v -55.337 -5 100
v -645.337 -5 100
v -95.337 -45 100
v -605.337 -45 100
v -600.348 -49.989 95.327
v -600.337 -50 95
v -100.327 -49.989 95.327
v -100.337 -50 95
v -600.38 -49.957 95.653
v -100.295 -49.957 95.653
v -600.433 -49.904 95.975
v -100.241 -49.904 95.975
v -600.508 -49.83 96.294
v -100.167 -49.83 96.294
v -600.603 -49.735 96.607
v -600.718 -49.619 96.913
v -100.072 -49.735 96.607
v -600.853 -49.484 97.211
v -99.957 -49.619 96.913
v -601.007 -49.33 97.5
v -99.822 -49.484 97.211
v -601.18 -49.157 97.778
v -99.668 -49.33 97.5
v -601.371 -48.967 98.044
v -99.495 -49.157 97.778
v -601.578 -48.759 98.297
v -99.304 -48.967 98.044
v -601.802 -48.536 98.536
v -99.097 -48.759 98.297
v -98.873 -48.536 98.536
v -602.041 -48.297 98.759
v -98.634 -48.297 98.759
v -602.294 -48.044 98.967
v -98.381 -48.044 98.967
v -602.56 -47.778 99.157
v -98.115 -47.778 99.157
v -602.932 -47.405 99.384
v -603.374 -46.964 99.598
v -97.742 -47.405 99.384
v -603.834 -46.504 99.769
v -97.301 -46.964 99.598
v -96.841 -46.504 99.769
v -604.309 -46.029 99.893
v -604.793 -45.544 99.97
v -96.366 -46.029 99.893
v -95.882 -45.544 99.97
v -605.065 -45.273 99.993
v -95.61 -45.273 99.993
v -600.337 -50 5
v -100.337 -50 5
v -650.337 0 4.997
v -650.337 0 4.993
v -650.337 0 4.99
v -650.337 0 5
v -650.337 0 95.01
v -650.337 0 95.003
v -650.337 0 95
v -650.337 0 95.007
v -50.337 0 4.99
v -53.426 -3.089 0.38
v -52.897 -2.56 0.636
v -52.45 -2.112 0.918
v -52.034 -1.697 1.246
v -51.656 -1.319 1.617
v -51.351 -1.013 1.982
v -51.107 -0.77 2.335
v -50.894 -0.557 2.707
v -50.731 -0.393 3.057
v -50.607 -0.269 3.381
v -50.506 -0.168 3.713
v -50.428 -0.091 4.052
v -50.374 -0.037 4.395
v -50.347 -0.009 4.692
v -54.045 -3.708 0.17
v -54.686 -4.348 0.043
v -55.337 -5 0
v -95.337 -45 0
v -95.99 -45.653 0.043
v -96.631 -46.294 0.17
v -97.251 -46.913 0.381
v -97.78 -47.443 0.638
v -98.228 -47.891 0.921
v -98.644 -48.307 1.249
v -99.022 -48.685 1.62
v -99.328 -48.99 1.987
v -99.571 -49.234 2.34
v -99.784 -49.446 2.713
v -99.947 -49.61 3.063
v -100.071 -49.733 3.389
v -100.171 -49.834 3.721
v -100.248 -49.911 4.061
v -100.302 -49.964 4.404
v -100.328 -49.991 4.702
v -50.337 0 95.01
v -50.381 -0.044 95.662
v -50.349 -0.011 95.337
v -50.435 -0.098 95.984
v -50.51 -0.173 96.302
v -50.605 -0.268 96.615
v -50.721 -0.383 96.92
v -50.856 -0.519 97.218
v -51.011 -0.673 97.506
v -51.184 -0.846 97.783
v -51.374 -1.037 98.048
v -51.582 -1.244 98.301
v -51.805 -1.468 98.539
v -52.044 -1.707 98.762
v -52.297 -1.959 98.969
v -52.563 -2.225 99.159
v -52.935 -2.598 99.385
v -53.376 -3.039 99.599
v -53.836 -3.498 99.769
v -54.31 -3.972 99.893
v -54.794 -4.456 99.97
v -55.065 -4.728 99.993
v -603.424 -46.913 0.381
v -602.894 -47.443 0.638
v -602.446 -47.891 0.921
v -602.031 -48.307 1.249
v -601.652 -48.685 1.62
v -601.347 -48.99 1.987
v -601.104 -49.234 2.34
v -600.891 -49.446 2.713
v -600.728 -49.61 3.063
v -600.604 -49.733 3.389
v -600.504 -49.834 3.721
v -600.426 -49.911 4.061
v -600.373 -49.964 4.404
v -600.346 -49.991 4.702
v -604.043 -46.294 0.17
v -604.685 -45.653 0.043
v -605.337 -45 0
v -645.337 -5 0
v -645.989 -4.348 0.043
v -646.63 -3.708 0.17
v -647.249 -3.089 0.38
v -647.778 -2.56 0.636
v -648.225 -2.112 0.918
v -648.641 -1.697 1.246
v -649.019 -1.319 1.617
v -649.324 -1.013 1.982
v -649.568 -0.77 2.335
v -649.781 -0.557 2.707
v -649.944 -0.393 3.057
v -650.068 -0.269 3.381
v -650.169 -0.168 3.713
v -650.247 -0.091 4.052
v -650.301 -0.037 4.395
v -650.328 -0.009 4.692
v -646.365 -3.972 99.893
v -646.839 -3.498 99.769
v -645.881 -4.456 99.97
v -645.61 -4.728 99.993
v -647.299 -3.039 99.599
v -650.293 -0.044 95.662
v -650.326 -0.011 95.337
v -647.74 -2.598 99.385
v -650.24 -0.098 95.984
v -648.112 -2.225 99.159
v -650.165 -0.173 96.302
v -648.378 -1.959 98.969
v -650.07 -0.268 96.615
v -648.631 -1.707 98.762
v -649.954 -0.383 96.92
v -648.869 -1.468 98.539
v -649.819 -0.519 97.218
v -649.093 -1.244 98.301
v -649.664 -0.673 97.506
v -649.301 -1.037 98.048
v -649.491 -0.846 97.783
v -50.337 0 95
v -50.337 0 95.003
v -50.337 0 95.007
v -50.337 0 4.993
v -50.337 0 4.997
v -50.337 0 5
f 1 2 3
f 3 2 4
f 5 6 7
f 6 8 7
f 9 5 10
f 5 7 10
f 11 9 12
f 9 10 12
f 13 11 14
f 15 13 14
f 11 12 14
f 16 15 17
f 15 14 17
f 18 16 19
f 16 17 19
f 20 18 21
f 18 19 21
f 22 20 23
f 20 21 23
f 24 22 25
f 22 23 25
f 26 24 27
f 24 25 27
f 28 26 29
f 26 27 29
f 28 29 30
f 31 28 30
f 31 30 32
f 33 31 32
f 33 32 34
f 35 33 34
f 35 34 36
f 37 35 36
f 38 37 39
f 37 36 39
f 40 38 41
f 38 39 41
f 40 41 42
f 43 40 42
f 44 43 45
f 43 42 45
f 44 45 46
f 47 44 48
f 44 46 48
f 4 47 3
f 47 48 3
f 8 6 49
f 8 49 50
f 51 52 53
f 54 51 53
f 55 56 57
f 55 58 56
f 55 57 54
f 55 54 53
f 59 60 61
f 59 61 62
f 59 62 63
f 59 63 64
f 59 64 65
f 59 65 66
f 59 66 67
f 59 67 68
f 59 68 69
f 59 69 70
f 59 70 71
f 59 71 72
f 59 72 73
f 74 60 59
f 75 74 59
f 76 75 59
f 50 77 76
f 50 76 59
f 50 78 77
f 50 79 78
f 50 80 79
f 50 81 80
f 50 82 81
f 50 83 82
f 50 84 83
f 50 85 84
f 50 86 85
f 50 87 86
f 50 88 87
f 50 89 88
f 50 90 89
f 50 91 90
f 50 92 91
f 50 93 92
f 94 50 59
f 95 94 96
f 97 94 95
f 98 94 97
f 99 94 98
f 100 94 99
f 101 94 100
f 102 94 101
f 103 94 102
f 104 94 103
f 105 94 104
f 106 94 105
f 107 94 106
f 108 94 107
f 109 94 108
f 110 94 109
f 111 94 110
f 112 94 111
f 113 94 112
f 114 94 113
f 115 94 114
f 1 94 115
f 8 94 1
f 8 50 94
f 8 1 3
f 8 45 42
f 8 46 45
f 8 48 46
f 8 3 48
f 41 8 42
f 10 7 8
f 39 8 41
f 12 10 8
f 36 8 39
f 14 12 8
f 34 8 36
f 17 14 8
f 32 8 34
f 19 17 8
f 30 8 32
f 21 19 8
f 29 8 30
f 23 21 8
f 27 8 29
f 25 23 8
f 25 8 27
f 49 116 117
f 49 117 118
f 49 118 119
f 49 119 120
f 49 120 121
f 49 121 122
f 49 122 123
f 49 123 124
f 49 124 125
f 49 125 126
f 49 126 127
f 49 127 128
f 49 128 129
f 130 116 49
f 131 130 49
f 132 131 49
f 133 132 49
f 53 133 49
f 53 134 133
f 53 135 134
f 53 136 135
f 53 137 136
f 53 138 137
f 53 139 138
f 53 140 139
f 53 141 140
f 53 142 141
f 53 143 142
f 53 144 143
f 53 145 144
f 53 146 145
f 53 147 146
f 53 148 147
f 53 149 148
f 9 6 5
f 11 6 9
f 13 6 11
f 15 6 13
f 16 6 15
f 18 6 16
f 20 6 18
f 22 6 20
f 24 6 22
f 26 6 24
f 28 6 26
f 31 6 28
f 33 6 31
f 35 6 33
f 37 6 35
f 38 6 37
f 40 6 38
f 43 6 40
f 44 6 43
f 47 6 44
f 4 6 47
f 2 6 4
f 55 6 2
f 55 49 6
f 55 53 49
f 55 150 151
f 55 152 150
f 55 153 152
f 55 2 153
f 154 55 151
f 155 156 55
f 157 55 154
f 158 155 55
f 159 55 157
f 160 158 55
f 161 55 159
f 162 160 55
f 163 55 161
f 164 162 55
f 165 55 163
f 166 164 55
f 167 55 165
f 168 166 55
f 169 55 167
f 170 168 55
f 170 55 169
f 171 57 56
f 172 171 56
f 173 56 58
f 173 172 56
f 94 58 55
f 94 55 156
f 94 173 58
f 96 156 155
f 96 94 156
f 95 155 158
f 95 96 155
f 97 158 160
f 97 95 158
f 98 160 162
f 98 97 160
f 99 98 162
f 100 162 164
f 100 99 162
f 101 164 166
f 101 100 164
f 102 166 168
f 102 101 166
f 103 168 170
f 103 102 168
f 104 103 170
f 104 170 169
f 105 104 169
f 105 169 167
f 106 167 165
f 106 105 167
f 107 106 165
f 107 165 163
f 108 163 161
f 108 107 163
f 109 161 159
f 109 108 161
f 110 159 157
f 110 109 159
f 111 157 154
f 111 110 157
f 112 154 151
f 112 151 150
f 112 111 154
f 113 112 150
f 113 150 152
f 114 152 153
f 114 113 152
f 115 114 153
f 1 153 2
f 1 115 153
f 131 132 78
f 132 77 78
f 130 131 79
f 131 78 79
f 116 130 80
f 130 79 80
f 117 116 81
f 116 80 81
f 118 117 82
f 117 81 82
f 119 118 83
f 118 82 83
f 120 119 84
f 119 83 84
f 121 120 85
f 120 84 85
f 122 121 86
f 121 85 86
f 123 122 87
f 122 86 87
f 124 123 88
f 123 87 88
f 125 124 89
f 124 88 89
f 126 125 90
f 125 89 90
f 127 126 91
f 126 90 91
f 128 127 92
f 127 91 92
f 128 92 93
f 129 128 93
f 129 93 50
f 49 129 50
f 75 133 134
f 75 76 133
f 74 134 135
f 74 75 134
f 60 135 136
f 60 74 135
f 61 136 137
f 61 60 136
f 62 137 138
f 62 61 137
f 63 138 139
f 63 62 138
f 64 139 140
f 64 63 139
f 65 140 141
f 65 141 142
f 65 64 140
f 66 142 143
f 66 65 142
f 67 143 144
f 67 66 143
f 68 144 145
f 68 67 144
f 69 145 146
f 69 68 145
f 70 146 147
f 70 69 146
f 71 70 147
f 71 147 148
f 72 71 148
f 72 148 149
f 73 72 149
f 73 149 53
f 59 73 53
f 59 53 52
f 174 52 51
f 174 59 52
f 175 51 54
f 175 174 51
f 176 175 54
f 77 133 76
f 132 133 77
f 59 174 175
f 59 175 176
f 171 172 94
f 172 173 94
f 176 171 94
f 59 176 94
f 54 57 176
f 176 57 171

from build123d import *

# Parameters (mm, degrees)
F0_W     = 600
F0_H     = 100
F3_DEPTH = 50
F1_SIZE  = 49.99999
F4_SIZE  = 49.99999
F2_R     = 5


# Not quite as in the source:
# - a fillet or chamfer is up to 0.001 mm smaller than in the source, because OpenCascade refuses the exact size


with BuildPart() as f3:
    # F0 (on Front) → F3 (new body)
    with BuildSketch(Plane.XZ):
        with Locations((-350.3373948519, 50)):
            Rectangle(F0_W, F0_H)
    extrude(amount=F3_DEPTH)

    # F1 (size 50 in the source; OpenCascade refuses exactly that, so slightly less here)
    f1_edges = [f3.edges().sort_by_distance(p)[0] for p in [
        (-50.337395, -50, 50),
    ]]
    chamfer(f1_edges, length=F1_SIZE)

    # F4 (size 50 in the source; OpenCascade refuses exactly that, so slightly less here)
    f4_edges = [f3.edges().sort_by_distance(p)[0] for p in [
        (-650.337395, -50, 50),
    ]]
    chamfer(f4_edges, length=F4_SIZE)

    # F2
    f2_edges = [f3.edges().sort_by_distance(p)[0] for p in [
        (-350.337395, -50, 0),
        (-350.337395, -50, 100),
        (-350.337395, 0, 100),
        (-350.337395, 0, 0),
    ]]
    fillet(f2_edges, radius=F2_R)


solid = f3.part
